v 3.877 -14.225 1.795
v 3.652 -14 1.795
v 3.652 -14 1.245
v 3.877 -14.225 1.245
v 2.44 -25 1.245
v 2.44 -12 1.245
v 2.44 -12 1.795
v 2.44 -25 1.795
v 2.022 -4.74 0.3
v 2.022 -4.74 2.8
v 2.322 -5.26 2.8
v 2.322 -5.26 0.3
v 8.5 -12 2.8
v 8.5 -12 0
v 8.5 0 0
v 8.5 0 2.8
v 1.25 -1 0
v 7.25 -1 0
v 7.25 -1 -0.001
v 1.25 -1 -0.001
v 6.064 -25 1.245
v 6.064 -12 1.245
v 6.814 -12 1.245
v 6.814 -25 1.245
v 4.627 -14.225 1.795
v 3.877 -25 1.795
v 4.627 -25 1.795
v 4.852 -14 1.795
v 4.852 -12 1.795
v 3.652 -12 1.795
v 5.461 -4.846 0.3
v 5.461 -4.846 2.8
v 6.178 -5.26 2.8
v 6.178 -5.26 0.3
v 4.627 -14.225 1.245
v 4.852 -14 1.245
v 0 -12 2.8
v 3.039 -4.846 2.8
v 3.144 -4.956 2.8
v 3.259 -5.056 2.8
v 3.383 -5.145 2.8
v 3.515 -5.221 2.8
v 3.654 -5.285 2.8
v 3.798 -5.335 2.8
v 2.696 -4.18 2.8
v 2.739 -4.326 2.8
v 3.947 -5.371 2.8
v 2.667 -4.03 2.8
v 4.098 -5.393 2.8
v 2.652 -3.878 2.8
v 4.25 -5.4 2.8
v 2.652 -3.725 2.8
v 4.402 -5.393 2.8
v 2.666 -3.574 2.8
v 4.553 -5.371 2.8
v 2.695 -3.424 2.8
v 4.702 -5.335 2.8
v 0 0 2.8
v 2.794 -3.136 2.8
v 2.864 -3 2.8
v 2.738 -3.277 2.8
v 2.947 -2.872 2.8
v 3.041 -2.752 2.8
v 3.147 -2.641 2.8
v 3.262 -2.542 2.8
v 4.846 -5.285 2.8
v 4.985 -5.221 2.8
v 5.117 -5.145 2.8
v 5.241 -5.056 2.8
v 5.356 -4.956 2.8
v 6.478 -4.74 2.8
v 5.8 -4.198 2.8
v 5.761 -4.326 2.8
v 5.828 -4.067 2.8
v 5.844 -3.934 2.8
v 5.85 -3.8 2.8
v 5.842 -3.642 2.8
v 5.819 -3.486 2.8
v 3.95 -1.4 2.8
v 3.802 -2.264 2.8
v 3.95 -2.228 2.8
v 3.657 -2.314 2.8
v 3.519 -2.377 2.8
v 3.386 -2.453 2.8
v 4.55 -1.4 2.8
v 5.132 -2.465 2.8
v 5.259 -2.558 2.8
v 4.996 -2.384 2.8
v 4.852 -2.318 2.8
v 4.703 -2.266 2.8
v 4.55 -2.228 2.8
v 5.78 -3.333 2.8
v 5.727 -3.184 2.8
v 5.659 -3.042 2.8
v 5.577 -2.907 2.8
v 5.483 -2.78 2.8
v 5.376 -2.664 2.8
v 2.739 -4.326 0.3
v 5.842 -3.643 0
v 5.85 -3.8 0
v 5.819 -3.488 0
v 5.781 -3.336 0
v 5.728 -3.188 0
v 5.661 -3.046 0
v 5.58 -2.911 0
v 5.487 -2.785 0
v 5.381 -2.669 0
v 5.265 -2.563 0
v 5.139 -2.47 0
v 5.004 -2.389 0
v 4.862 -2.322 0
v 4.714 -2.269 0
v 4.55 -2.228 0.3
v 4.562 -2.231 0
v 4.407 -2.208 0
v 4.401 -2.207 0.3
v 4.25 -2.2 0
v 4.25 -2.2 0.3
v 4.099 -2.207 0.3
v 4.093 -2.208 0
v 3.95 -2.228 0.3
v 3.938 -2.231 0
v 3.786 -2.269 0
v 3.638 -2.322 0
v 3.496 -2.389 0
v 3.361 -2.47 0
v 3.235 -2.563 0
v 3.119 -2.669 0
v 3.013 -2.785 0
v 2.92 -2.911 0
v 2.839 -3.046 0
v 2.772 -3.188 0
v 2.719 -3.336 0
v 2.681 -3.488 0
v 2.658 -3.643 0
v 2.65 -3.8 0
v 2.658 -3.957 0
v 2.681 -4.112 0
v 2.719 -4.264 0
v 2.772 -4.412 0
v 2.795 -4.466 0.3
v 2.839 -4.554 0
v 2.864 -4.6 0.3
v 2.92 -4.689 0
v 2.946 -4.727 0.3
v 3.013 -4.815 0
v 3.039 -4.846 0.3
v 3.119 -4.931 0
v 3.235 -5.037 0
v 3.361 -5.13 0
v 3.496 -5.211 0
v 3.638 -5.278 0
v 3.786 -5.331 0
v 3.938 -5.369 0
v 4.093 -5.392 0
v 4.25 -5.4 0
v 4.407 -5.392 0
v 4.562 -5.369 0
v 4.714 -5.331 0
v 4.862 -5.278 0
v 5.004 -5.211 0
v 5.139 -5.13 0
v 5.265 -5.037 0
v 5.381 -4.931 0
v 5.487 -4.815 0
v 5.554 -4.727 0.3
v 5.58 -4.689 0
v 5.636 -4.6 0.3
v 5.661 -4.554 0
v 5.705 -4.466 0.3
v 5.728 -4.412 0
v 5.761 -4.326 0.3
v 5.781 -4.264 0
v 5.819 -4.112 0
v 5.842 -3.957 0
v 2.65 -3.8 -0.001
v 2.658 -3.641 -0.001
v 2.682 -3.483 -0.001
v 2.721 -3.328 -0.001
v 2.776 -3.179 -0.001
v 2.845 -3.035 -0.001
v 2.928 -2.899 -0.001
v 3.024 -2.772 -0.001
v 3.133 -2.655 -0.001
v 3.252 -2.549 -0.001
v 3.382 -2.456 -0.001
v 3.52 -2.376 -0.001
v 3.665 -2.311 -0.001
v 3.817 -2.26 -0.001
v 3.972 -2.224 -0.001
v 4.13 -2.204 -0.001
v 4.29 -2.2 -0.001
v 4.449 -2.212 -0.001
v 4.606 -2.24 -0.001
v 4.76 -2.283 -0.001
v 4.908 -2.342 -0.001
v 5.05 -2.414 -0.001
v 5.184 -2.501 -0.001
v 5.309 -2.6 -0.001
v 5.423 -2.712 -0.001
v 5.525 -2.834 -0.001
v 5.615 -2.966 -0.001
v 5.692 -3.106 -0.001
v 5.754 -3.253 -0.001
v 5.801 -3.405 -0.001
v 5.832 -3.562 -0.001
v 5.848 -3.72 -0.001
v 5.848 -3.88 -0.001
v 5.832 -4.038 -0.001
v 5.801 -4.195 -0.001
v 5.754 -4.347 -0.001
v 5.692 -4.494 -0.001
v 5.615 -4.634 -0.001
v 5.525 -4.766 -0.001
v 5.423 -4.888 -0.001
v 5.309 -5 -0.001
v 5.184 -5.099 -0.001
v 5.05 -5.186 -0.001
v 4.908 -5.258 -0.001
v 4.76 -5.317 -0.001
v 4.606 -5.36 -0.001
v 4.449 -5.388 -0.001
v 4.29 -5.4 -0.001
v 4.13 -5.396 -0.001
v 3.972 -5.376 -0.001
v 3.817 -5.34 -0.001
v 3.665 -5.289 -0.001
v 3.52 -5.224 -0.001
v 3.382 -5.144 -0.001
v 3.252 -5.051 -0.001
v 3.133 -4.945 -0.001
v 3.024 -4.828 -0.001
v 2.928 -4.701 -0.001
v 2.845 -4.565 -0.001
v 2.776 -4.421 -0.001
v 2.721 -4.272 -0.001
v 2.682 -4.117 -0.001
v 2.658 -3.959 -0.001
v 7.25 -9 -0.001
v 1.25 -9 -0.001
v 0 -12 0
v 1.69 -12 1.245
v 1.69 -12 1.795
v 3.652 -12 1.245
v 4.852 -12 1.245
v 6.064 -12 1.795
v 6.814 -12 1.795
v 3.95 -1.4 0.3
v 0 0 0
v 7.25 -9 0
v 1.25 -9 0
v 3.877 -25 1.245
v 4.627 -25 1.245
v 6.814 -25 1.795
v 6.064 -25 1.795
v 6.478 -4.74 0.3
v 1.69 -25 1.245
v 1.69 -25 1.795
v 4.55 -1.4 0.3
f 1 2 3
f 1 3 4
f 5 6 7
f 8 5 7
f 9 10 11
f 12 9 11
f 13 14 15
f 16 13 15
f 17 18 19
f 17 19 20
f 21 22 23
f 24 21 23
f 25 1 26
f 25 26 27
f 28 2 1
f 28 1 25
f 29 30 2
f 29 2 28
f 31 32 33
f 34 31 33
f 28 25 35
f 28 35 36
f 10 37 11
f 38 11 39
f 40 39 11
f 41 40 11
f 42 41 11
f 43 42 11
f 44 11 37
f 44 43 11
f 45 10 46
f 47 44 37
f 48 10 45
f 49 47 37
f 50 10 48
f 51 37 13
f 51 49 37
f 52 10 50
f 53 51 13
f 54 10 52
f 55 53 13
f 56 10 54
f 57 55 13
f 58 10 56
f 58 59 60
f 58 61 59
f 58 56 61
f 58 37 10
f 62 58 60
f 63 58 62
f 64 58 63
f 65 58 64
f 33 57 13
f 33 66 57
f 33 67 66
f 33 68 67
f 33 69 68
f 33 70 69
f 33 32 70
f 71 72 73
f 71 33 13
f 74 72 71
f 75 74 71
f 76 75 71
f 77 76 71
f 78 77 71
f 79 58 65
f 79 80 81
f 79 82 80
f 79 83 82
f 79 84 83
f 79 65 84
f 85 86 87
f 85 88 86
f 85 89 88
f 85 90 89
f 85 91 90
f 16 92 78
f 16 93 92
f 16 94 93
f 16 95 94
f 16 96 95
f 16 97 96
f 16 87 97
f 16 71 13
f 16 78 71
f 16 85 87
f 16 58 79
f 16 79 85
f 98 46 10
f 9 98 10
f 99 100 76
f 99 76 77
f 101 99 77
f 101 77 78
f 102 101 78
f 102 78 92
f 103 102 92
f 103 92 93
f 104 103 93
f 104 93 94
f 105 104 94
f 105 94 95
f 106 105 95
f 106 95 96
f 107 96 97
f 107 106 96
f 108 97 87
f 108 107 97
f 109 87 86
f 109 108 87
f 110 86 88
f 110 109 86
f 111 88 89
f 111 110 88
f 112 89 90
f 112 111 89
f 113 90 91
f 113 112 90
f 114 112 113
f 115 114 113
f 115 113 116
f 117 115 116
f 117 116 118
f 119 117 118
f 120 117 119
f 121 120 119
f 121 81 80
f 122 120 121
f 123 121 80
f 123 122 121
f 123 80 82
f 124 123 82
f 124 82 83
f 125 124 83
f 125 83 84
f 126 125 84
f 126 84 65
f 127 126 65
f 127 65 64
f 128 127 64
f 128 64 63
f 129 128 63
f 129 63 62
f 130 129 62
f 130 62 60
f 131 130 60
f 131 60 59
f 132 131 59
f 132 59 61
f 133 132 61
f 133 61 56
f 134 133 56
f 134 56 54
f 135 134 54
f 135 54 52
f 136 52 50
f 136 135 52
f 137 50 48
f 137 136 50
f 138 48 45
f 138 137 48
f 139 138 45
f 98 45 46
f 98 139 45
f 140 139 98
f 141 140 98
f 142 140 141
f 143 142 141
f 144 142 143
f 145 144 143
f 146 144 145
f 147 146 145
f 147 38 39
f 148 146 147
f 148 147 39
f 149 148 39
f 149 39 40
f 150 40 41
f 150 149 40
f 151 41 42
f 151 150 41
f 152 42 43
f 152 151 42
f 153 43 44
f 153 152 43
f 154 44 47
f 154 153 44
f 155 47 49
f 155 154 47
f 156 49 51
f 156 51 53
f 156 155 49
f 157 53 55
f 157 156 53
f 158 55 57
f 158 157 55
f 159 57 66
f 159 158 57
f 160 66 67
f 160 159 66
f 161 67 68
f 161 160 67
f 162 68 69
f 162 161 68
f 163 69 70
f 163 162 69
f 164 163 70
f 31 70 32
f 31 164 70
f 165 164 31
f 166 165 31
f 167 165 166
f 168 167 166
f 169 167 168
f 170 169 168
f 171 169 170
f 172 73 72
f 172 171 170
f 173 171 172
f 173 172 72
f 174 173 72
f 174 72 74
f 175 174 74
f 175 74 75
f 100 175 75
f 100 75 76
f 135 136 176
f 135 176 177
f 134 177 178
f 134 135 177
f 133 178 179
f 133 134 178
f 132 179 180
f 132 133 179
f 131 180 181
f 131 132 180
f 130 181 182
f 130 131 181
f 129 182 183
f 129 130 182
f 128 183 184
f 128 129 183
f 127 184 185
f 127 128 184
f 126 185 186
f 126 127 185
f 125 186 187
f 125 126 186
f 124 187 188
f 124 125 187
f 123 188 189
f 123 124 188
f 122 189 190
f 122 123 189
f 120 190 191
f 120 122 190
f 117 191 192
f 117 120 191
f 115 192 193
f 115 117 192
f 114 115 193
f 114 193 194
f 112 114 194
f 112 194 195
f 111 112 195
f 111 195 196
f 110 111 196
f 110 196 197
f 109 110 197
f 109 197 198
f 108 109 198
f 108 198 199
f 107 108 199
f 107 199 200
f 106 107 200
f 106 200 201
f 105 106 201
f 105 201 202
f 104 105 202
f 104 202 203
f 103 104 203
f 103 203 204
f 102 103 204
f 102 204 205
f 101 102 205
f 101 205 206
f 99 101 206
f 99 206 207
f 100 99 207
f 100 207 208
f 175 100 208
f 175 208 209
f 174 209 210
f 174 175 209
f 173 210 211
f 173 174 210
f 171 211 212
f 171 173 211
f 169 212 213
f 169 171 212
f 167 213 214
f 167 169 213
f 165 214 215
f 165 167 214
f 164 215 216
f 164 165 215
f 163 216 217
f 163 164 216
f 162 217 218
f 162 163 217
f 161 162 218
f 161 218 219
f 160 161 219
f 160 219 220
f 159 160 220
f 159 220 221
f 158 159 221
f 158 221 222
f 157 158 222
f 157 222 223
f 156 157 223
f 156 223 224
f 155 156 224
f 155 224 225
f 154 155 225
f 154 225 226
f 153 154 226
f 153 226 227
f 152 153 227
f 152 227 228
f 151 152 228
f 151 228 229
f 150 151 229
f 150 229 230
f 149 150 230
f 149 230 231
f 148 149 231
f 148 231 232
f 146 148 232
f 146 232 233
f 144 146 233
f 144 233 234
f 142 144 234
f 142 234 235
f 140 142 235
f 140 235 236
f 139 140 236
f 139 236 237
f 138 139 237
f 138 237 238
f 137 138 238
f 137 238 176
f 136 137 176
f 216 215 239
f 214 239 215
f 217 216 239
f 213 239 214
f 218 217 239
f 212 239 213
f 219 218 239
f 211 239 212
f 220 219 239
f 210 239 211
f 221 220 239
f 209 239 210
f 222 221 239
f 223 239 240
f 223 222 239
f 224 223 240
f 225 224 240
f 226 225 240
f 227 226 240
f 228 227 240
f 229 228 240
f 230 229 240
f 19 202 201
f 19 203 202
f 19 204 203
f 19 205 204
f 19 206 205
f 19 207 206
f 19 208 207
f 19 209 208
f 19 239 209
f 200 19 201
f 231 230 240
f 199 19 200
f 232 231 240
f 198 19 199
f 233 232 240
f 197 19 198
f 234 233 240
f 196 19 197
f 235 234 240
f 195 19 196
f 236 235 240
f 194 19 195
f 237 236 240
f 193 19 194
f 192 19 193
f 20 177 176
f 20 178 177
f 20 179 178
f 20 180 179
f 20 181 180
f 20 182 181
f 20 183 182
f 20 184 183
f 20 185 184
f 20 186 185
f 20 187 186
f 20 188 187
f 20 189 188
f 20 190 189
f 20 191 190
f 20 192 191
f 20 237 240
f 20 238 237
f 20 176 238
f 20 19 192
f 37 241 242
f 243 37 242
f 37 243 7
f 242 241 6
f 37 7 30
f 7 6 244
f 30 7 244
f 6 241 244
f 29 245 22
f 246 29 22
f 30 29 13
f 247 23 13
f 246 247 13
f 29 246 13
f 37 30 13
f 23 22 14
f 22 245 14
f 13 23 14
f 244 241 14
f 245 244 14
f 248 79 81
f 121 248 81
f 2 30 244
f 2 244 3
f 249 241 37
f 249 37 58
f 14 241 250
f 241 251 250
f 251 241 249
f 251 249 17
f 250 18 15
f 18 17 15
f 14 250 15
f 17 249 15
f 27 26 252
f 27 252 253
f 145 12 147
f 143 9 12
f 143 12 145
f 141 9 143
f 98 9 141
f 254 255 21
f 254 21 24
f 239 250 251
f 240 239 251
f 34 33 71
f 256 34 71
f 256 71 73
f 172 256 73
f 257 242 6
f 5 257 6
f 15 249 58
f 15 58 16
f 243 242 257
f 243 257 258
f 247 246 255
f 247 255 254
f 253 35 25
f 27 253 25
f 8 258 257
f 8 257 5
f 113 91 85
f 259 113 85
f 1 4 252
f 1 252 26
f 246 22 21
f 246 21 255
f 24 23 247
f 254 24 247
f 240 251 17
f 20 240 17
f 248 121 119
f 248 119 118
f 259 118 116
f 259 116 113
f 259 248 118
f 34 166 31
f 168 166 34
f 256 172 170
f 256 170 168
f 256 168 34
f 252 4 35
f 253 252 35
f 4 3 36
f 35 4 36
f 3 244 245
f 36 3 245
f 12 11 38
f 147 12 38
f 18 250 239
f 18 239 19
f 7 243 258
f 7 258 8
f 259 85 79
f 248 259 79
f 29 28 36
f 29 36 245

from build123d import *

# Parameters (mm, degrees)
SKETCH1_W           = 8.5
SKETCH1_H           = 12
SKETCH1_R           = 1.6
BOSS_EXTRUDE1_DEPTH = 2.8
CUT_EXTRUDE1_DEPTH  = 2.5
SKETCH3_W           = 0.75
SKETCH3_H           = 0.55
BOSS_EXTRUDE2_DEPTH = 13
BOSS_EXTRUDE3_DEPTH = 0.55
SKETCH5_W           = 6
SKETCH5_H           = 8
SKETCH5_R           = 1.6
BOSS_EXTRUDE4_DEPTH = 0.001


with BuildPart() as part:
    # Sketch1 → Boss-Extrude1 (new body)
    with BuildSketch(Plane.XY):
        with Locations((4.25, -6)):
            Rectangle(SKETCH1_W, SKETCH1_H)
        with Locations((4.25, -3.8)):
            Circle(SKETCH1_R, mode=Mode.SUBTRACT)
    extrude(amount=BOSS_EXTRUDE1_DEPTH)

    # Sketch2 → Cut-Extrude1 (cut)
    with BuildSketch(Plane.XY.offset(2.8)):
        with BuildLine():
            Line((2.321539031, -5.259807621), (3.038934241, -4.845619303))
            ThreePointArc((3.038934241, -4.845619303), (2.864359354, -4.6), (2.738934241, -4.326004061))
            Line((2.738934241, -4.326004061), (2.021539031, -4.740192379))
            Line((2.021539031, -4.740192379), (2.321539031, -5.259807621))
        make_face()
        with BuildLine():
            Line((6.178460969, -5.259807621), (6.478460969, -4.740192379))
            Line((6.478460969, -4.740192379), (5.761065759, -4.326004061))
            ThreePointArc((5.761065759, -4.326004061), (5.635640646, -4.6), (5.461065759, -4.845619303))
            Line((5.461065759, -4.845619303), (6.178460969, -5.259807621))
        make_face()
        with BuildLine():
            ThreePointArc((3.95, -2.228376635), (4.25, -2.2), (4.55, -2.228376635))
            Line((4.55, -2.228376635), (4.55, -1.4))
            Line((4.55, -1.4), (3.95, -1.4))
            Line((3.95, -1.4), (3.95, -2.228376635))
        make_face()
    extrude(amount=-CUT_EXTRUDE1_DEPTH, mode=Mode.SUBTRACT)

    # Sketch3 → Boss-Extrude2 (add)
    with BuildSketch(Plane.XZ.offset(12)):
        with Locations((2.065, 1.519799242)):
            Rectangle(SKETCH3_W, SKETCH3_H)
        with Locations((4.252122452, 1.519799242)):
            Rectangle(SKETCH3_W, SKETCH3_H)
        with Locations((6.439244903, 1.519799242)):
            Rectangle(SKETCH3_W, SKETCH3_H)
    extrude(amount=BOSS_EXTRUDE2_DEPTH)

    # Sketch4 → Boss-Extrude3 (add)
    with BuildSketch(Plane.XY.offset(1.794799242)):
        Polygon((3.652122452, -14), (4.152122452, -14.5), (4.352122452, -14.5), (4.852122452, -14), (4.852122452, -12), (3.652122452, -12), align=None)
    extrude(amount=-BOSS_EXTRUDE3_DEPTH)

    # Sketch5 → Boss-Extrude4 (add)
    with BuildSketch(Plane(origin=(0, 0, 0), x_dir=(-1, 0, 0), z_dir=(0, 0, -1))):
        with Locations((-4.25, -5)):
            Rectangle(SKETCH5_W, SKETCH5_H)
        with Locations((-4.25, -3.8)):
            Circle(SKETCH5_R, mode=Mode.SUBTRACT)
    extrude(amount=BOSS_EXTRUDE4_DEPTH)


solid = part.part
